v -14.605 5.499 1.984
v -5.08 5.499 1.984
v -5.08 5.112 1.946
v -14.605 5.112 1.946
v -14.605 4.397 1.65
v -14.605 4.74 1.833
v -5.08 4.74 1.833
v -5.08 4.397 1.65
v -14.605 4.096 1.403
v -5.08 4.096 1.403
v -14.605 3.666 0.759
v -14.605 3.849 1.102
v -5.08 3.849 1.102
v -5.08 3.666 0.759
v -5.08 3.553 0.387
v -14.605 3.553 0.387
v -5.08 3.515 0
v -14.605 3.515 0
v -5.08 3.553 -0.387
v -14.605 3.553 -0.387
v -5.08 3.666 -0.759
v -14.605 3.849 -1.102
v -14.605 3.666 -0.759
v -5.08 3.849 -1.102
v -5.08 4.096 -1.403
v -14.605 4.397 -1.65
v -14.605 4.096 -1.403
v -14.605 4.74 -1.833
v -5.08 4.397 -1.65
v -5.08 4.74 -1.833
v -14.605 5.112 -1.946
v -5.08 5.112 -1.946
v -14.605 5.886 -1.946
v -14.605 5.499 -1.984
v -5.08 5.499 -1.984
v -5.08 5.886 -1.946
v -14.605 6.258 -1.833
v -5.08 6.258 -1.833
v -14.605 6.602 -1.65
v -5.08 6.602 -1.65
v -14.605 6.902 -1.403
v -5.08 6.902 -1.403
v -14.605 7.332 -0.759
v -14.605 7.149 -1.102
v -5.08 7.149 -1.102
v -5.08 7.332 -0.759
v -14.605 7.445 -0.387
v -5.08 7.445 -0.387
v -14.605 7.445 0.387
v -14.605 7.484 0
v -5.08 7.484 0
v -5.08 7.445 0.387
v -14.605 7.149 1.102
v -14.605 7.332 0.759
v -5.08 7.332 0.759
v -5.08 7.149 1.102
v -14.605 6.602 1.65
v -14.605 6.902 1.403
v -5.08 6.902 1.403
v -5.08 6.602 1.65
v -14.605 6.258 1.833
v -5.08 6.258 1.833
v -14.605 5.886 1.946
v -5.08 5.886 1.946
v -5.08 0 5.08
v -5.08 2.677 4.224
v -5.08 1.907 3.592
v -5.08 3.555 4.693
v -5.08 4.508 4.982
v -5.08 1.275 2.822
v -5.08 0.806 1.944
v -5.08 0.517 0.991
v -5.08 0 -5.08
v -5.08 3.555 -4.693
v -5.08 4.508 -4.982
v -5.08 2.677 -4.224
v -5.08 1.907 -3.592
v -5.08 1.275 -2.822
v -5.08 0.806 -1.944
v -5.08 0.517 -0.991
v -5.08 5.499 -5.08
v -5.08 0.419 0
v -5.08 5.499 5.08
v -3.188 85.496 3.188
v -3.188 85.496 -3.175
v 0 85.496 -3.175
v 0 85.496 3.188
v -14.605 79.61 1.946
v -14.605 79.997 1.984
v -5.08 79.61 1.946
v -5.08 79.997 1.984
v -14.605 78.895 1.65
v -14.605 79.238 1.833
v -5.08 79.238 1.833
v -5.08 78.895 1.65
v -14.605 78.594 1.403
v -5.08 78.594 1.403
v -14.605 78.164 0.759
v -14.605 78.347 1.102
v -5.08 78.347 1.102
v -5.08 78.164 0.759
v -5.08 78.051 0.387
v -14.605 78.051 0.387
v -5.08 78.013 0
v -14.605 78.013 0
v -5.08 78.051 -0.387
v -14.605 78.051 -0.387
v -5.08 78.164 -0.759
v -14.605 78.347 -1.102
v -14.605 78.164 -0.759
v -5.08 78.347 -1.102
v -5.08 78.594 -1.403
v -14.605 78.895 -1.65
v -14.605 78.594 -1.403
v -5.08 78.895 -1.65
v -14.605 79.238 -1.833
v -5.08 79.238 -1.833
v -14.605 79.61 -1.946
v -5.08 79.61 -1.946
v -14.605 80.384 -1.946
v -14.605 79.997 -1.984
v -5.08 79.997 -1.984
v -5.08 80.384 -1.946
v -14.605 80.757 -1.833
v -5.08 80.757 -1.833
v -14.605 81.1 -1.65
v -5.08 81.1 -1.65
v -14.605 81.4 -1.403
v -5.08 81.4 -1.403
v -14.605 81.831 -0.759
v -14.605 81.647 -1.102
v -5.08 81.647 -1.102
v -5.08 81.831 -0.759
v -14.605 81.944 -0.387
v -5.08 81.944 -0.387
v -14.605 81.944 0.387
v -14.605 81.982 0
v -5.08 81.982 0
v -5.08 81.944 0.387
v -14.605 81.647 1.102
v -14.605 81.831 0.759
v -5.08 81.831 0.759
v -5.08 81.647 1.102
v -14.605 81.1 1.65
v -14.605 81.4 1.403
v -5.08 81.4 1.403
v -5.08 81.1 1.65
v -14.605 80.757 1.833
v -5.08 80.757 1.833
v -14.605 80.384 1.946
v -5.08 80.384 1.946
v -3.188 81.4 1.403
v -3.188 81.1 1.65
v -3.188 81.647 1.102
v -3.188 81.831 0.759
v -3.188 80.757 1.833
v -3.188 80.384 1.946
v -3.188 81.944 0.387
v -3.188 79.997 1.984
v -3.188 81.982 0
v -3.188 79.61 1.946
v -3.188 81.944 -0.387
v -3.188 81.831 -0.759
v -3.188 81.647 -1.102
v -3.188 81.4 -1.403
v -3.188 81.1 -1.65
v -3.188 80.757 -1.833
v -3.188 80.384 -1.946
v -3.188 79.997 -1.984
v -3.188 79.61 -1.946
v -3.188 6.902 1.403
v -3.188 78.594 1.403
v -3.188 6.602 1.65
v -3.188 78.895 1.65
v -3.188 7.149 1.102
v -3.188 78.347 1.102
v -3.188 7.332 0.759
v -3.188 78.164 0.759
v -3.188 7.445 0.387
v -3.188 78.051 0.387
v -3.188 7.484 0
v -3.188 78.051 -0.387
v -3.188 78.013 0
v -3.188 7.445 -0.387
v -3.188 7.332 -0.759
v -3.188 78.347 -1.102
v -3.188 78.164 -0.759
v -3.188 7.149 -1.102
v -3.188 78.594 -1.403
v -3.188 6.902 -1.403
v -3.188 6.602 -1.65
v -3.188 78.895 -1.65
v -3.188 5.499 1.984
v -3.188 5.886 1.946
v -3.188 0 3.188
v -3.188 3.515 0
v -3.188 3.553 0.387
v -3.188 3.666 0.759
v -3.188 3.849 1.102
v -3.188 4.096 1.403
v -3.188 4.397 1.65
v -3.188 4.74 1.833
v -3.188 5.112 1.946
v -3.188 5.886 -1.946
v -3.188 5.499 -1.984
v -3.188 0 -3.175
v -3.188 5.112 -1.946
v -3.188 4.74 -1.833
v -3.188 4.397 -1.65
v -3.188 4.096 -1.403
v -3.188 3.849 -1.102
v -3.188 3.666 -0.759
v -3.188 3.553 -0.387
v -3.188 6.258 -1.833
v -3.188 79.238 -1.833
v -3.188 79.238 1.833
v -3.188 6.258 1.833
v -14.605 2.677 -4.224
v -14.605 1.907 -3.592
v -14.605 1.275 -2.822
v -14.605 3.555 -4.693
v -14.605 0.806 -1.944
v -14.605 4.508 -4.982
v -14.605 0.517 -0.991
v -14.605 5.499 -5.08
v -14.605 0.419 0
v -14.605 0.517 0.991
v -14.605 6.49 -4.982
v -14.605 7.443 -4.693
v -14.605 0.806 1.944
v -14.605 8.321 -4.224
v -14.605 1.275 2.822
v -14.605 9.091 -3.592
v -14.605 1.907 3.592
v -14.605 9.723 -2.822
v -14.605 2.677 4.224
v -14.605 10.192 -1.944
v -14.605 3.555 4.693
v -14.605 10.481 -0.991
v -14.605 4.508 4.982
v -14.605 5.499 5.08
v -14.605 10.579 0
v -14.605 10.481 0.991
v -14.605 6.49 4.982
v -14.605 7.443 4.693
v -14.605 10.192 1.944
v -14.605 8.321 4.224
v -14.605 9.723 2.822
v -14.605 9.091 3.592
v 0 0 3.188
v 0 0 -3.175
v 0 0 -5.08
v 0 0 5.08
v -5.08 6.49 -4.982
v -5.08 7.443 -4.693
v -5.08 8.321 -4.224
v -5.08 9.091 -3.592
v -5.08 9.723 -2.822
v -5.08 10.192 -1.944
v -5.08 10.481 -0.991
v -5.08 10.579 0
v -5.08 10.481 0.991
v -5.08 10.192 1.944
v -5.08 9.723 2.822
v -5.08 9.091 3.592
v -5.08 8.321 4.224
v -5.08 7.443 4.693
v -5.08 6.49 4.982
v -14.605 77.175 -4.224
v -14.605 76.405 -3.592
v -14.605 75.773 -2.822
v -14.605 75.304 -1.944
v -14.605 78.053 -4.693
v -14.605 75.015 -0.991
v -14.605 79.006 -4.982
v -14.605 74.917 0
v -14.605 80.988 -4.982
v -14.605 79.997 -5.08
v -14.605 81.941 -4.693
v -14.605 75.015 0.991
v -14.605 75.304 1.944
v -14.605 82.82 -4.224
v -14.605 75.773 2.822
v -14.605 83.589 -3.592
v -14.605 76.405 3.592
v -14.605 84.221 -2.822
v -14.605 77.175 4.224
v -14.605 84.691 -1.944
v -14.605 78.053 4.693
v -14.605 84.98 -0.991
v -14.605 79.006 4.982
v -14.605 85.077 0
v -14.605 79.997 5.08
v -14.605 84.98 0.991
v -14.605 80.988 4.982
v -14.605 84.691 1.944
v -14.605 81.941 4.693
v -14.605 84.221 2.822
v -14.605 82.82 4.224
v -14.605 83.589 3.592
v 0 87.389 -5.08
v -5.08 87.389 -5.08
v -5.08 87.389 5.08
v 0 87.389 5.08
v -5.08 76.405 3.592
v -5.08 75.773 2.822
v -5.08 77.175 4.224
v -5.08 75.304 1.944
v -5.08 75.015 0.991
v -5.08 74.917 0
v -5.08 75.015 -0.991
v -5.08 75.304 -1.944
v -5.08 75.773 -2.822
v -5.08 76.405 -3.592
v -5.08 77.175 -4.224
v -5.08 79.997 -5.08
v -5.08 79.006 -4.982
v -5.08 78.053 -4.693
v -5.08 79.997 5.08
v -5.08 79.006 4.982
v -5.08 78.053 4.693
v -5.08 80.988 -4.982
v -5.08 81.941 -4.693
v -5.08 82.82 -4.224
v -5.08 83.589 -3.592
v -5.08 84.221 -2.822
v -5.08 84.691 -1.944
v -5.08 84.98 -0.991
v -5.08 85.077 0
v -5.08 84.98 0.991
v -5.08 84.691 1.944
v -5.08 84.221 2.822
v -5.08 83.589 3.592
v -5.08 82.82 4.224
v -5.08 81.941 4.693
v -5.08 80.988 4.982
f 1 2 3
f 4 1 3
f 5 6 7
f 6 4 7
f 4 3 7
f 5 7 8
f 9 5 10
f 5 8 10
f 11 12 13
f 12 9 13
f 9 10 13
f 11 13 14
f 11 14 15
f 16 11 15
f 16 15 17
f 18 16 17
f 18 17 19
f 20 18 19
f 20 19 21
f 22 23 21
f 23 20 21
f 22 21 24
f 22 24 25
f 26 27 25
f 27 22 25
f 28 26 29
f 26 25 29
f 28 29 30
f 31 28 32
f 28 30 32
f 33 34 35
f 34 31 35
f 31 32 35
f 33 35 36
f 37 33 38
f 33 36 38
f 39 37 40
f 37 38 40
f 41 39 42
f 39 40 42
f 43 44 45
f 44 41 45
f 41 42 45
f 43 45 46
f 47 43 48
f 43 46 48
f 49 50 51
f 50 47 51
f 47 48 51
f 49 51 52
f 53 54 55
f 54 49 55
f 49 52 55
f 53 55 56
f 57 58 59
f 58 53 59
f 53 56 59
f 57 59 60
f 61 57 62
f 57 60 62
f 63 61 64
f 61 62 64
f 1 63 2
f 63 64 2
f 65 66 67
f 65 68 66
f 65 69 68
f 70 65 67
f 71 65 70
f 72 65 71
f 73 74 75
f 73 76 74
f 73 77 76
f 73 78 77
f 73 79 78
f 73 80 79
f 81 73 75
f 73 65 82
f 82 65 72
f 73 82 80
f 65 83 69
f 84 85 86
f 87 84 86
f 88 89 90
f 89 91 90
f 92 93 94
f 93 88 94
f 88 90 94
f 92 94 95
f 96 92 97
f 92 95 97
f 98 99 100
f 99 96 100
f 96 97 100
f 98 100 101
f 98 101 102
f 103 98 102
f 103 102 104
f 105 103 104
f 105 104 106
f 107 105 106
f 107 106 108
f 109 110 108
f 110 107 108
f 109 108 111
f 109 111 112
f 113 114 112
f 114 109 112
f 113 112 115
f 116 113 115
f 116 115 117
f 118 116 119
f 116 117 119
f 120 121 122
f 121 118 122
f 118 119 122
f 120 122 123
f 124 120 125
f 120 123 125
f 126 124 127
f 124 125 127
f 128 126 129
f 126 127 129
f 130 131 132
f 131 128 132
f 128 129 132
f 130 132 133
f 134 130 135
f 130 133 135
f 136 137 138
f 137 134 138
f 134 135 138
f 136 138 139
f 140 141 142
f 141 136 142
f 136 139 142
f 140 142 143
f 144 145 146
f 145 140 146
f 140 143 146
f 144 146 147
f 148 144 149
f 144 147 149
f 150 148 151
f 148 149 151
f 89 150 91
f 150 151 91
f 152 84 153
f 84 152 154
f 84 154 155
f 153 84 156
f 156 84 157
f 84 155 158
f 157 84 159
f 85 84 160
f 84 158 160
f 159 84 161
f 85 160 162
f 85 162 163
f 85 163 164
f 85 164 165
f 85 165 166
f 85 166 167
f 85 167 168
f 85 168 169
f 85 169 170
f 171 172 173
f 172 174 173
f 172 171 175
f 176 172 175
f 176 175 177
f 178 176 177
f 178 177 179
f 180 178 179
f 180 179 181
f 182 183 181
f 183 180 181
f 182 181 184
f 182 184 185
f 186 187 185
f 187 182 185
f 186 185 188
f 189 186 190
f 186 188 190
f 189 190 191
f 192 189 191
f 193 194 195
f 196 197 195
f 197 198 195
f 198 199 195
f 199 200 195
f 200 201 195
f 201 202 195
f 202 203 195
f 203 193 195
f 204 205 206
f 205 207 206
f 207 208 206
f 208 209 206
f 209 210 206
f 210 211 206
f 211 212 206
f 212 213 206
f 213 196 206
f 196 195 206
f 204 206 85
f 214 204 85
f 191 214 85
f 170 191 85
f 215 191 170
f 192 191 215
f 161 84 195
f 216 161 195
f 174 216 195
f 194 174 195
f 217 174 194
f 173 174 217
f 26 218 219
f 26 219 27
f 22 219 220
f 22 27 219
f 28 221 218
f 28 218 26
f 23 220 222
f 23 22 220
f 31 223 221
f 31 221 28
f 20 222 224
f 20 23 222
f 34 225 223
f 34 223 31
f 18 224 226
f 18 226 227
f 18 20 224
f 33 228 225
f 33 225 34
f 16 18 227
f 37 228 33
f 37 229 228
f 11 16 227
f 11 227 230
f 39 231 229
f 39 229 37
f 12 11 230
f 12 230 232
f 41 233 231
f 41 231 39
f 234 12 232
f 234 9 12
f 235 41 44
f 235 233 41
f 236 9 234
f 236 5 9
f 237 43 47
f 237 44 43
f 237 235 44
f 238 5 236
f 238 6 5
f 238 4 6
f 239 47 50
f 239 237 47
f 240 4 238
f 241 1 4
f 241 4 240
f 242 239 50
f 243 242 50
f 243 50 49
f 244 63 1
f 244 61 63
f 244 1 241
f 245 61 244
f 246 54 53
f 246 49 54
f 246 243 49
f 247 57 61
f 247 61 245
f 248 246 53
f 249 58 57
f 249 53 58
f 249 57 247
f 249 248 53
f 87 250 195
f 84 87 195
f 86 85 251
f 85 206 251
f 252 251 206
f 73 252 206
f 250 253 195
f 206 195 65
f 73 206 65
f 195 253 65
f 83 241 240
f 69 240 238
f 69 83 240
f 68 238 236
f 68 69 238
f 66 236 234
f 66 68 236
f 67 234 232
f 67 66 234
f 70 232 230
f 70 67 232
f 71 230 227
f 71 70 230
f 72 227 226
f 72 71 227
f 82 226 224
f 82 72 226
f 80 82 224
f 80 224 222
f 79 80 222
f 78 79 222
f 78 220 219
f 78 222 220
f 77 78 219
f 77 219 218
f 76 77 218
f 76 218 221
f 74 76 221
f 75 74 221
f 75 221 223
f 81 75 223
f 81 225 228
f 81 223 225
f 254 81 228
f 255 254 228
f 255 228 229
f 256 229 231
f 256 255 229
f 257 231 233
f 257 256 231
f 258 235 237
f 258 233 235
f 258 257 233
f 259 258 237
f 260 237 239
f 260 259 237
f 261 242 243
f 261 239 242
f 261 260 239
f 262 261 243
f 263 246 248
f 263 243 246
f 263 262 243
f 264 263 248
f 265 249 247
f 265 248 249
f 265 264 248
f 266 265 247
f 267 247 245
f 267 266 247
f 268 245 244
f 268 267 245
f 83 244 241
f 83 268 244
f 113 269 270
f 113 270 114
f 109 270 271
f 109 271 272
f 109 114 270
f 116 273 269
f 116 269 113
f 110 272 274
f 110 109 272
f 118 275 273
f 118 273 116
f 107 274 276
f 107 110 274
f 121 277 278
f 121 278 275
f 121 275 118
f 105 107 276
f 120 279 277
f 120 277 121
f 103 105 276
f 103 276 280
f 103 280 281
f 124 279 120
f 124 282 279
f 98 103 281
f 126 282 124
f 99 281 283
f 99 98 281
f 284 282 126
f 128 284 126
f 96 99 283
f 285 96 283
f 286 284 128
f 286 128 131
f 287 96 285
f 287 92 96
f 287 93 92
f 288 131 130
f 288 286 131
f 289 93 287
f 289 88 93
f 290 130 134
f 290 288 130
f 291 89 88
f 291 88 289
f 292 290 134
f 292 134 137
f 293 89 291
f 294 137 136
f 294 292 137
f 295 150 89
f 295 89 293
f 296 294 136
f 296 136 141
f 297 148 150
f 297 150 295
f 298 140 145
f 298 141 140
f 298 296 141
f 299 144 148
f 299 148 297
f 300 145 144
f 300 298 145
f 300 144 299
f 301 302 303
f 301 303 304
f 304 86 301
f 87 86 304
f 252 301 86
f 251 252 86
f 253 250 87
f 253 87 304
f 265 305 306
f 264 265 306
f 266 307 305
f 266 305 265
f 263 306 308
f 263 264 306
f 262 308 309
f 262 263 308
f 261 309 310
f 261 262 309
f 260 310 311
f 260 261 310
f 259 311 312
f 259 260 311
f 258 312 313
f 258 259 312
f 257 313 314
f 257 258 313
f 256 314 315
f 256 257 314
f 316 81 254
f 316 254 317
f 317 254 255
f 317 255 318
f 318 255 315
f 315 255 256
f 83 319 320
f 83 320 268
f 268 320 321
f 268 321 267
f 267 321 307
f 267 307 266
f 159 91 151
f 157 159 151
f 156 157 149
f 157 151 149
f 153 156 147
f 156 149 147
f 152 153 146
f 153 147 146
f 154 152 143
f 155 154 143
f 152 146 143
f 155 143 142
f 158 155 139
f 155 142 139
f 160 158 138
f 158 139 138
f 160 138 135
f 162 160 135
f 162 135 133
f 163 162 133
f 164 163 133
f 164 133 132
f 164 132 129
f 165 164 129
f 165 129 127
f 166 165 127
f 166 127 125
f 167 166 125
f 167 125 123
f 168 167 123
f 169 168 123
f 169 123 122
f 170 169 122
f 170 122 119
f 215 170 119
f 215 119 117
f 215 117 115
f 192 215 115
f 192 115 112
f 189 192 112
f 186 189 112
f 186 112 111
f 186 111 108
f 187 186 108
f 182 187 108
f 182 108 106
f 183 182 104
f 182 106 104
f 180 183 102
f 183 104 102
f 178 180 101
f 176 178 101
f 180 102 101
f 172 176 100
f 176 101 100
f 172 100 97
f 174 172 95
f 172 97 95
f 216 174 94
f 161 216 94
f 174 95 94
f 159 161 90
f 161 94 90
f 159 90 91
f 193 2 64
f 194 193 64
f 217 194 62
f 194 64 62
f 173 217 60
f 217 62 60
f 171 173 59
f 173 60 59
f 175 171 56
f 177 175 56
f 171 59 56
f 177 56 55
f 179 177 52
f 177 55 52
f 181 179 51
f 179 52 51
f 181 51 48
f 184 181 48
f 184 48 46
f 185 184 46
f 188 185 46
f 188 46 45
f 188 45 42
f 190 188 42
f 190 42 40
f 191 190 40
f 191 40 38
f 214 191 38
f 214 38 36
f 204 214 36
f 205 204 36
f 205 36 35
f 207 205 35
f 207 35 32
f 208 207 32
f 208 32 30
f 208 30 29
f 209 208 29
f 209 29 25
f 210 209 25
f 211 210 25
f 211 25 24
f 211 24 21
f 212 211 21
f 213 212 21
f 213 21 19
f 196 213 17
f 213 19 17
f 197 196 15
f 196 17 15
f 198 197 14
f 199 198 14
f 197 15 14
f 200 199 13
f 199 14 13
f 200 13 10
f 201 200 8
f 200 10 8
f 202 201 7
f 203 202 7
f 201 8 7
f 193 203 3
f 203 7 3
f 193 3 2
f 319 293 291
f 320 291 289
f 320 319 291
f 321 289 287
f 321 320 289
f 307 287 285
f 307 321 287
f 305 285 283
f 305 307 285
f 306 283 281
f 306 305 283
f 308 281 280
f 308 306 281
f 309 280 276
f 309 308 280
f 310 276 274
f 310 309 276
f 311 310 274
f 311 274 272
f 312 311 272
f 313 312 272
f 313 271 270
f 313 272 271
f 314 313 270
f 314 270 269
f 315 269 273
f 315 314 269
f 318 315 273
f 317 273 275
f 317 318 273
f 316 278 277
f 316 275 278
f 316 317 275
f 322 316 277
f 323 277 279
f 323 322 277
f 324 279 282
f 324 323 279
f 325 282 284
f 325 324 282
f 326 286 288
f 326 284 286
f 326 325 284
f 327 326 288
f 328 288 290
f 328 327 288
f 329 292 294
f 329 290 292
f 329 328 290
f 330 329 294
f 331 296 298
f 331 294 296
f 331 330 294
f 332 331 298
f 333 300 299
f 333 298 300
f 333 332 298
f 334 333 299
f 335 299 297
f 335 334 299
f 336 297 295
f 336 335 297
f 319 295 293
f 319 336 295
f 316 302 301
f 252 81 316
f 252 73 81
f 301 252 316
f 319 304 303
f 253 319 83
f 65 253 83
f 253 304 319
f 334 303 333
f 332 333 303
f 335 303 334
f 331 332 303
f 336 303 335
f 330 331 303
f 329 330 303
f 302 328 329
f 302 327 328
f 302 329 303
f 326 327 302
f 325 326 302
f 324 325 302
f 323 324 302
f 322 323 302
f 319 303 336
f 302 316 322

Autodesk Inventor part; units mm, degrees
ref_plane "YZ Plane" through (0, 0, 0) normal (1, 0, 0) x (0, 1, 0)
ref_plane "XZ Plane" through (0, 0, 0) normal (0, 1, 0) x (-1, 0, 0)
ref_plane "XY Plane" through (0, 0, 0) normal (0, 0, 1) x (1, 0, 0)
sketch "Sketch1" plane through (0, 0, 0) normal (0, 1, 0) x (-1, 0, 0)
  line L0 (0, 3.1877) -> (3.1877, 3.1877)
  line L1 (3.1877, 3.1877) -> (3.1877, -3.175)
  line L2 (3.1877, -3.175) -> (0, -3.175)
  line L3 (0, 5.08) -> (5.08, 5.08)
  line L4 (5.08, 5.08) -> (5.08, -5.08)
  line L5 (5.08, -5.08) -> (0, -5.08)
  line L6 (0, -5.08) -> (0, -3.175)
  line L7 (0, 3.1877) -> (0, 5.08)
  point P0 (0, 0)
  dimension "d0" = 3.1877
  dimension "d1" = 5.08
  dimension "d2" = 10.16
extrude "Extrusion1" add sketch "Sketch1" along normal blind 85.4964
sketch "Sketch2" plane through (0, 85.4964, 0) normal (0, 1, 0) x (1, 0, 0)
  line L0 (0, -5.08) -> (0, -3.1877) projected
  line L1 (0, 5.08) -> (-5.08, 5.08) projected
  line L2 (0, -5.08) -> (-5.08, -5.08)
  line L3 (-5.08, -5.08) -> (-5.08, 5.08)
  line L4 (-5.08, 5.08) -> (0, 5.08)
  line L5 (0, 5.08) -> (0, -5.08)
  point P0 (0, 0)
extrude "Extrusion2" add sketch "Sketch2" along normal blind 1.8923
sketch "Sketch3" plane through (-5.08, 0, -5.08) normal (-1, 0, 0) x (0, 0, 1)
  circle A0 centre (5.08, 5.4991) radius 1.9844
  circle A1 centre (5.08, 79.9973) radius 1.9844
  point P0 (5.08, 0)
  dimension "d7" = 3.9688
  dimension "d8" = 3.9688
extrude "Extrusion3" cut sketch "Sketch3" against normal blind 1.8923
sketch "Sketch4" plane through (-5.08, 5.4991, 0) normal (-1, 0, 0) x (0, 0, 1)
  circle A0 centre (0, 0) radius 1.9844 projected
  circle A1 centre (0, 0) radius 1.9844
  circle A2 centre (0, 0) radius 5.08
  line L0 (5.08, -5.4991) -> (5.08, 81.8896) projected
  circle A3 centre (0, 74.4982) radius 1.9844 projected
  circle A4 centre (0, 74.4982) radius 1.9844
  circle A5 centre (0, 74.4982) radius 5.08
  point P0 (0, -5.4991)
extrude "Extrusion4" add sketch "Sketch4" along normal blind 9.525
properties part number "hs_intake_joint"
